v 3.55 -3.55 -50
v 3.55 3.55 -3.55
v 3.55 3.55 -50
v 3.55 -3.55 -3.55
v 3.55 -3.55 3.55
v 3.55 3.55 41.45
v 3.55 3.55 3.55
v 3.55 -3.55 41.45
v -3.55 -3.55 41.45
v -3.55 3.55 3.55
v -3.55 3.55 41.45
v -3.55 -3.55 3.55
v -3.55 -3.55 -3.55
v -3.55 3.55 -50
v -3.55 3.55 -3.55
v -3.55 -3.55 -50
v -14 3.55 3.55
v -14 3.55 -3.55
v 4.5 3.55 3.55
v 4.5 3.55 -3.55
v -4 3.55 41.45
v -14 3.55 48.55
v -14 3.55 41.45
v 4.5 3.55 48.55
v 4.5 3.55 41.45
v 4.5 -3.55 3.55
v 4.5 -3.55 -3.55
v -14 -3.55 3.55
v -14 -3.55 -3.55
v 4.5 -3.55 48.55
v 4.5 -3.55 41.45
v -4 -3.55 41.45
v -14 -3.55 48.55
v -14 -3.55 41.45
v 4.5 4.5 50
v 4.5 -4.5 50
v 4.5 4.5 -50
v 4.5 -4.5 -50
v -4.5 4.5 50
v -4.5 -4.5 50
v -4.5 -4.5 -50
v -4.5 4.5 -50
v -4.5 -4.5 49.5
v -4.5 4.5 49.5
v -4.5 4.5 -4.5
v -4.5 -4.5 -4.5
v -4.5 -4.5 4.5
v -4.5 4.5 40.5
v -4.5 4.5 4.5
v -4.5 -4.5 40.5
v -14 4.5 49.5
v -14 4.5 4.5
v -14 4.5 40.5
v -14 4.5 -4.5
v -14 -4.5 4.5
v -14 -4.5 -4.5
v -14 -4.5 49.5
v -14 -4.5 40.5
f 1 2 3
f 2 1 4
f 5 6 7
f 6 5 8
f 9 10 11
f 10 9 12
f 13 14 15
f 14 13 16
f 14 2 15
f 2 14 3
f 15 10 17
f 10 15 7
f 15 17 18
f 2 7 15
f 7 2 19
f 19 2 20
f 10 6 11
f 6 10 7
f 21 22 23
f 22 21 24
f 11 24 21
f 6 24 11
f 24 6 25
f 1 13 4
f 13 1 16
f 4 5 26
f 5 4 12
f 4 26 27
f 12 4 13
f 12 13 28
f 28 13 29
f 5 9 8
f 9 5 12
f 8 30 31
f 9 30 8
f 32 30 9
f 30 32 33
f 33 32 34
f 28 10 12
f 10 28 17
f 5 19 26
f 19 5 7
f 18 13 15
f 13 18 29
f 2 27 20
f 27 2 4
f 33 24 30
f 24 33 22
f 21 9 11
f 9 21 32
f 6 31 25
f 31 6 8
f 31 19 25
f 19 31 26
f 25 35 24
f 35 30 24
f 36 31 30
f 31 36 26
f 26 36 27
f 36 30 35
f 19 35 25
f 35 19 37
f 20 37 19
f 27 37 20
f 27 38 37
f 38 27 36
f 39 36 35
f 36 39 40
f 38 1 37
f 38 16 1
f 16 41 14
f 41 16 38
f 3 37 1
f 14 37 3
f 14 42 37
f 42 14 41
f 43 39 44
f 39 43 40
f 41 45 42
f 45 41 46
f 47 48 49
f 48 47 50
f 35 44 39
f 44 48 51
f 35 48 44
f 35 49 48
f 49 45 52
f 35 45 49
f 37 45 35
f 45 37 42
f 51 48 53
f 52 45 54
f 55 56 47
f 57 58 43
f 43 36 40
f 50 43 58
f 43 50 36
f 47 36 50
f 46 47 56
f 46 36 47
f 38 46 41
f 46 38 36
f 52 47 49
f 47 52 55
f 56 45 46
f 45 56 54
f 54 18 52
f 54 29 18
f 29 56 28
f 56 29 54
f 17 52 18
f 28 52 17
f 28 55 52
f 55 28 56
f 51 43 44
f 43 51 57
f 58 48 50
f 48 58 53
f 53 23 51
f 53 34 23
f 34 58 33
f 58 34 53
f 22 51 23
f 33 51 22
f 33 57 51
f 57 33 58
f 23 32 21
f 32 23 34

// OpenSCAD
module distance_sensor() {
    cube([7.1, 7.1, 12], center=true);
}

module side_distance_meter(with_holes=true) {
    
    difference() {
        cube([9,9,100], center=true);
        if (with_holes) {
            translate([0,0,-5]) cube([7.1,7.1,100], center=true);
            translate([-9,0,0]) cube([11,7.1,7.1], center=true);
            translate([-9,0,45]) cube([11,7.1,7.1], center=true);
        }
        
        translate([0,0,45]) rotate([0,90,0]) distance_sensor();
        rotate([0,90,0]) distance_sensor();
    }
    
    translate([-9,0,0]) difference() {
        cube([10,9,9], center=true);
        if (with_holes) 
            cube([11,7.1,7.1], center=true);
    }
    
    translate([-9,0,45]) difference() {
        cube([10,9,9], center=true);
        if (with_holes) 
            cube([11,7.1,7.1], center=true);
    }
}

side_distance_meter();
